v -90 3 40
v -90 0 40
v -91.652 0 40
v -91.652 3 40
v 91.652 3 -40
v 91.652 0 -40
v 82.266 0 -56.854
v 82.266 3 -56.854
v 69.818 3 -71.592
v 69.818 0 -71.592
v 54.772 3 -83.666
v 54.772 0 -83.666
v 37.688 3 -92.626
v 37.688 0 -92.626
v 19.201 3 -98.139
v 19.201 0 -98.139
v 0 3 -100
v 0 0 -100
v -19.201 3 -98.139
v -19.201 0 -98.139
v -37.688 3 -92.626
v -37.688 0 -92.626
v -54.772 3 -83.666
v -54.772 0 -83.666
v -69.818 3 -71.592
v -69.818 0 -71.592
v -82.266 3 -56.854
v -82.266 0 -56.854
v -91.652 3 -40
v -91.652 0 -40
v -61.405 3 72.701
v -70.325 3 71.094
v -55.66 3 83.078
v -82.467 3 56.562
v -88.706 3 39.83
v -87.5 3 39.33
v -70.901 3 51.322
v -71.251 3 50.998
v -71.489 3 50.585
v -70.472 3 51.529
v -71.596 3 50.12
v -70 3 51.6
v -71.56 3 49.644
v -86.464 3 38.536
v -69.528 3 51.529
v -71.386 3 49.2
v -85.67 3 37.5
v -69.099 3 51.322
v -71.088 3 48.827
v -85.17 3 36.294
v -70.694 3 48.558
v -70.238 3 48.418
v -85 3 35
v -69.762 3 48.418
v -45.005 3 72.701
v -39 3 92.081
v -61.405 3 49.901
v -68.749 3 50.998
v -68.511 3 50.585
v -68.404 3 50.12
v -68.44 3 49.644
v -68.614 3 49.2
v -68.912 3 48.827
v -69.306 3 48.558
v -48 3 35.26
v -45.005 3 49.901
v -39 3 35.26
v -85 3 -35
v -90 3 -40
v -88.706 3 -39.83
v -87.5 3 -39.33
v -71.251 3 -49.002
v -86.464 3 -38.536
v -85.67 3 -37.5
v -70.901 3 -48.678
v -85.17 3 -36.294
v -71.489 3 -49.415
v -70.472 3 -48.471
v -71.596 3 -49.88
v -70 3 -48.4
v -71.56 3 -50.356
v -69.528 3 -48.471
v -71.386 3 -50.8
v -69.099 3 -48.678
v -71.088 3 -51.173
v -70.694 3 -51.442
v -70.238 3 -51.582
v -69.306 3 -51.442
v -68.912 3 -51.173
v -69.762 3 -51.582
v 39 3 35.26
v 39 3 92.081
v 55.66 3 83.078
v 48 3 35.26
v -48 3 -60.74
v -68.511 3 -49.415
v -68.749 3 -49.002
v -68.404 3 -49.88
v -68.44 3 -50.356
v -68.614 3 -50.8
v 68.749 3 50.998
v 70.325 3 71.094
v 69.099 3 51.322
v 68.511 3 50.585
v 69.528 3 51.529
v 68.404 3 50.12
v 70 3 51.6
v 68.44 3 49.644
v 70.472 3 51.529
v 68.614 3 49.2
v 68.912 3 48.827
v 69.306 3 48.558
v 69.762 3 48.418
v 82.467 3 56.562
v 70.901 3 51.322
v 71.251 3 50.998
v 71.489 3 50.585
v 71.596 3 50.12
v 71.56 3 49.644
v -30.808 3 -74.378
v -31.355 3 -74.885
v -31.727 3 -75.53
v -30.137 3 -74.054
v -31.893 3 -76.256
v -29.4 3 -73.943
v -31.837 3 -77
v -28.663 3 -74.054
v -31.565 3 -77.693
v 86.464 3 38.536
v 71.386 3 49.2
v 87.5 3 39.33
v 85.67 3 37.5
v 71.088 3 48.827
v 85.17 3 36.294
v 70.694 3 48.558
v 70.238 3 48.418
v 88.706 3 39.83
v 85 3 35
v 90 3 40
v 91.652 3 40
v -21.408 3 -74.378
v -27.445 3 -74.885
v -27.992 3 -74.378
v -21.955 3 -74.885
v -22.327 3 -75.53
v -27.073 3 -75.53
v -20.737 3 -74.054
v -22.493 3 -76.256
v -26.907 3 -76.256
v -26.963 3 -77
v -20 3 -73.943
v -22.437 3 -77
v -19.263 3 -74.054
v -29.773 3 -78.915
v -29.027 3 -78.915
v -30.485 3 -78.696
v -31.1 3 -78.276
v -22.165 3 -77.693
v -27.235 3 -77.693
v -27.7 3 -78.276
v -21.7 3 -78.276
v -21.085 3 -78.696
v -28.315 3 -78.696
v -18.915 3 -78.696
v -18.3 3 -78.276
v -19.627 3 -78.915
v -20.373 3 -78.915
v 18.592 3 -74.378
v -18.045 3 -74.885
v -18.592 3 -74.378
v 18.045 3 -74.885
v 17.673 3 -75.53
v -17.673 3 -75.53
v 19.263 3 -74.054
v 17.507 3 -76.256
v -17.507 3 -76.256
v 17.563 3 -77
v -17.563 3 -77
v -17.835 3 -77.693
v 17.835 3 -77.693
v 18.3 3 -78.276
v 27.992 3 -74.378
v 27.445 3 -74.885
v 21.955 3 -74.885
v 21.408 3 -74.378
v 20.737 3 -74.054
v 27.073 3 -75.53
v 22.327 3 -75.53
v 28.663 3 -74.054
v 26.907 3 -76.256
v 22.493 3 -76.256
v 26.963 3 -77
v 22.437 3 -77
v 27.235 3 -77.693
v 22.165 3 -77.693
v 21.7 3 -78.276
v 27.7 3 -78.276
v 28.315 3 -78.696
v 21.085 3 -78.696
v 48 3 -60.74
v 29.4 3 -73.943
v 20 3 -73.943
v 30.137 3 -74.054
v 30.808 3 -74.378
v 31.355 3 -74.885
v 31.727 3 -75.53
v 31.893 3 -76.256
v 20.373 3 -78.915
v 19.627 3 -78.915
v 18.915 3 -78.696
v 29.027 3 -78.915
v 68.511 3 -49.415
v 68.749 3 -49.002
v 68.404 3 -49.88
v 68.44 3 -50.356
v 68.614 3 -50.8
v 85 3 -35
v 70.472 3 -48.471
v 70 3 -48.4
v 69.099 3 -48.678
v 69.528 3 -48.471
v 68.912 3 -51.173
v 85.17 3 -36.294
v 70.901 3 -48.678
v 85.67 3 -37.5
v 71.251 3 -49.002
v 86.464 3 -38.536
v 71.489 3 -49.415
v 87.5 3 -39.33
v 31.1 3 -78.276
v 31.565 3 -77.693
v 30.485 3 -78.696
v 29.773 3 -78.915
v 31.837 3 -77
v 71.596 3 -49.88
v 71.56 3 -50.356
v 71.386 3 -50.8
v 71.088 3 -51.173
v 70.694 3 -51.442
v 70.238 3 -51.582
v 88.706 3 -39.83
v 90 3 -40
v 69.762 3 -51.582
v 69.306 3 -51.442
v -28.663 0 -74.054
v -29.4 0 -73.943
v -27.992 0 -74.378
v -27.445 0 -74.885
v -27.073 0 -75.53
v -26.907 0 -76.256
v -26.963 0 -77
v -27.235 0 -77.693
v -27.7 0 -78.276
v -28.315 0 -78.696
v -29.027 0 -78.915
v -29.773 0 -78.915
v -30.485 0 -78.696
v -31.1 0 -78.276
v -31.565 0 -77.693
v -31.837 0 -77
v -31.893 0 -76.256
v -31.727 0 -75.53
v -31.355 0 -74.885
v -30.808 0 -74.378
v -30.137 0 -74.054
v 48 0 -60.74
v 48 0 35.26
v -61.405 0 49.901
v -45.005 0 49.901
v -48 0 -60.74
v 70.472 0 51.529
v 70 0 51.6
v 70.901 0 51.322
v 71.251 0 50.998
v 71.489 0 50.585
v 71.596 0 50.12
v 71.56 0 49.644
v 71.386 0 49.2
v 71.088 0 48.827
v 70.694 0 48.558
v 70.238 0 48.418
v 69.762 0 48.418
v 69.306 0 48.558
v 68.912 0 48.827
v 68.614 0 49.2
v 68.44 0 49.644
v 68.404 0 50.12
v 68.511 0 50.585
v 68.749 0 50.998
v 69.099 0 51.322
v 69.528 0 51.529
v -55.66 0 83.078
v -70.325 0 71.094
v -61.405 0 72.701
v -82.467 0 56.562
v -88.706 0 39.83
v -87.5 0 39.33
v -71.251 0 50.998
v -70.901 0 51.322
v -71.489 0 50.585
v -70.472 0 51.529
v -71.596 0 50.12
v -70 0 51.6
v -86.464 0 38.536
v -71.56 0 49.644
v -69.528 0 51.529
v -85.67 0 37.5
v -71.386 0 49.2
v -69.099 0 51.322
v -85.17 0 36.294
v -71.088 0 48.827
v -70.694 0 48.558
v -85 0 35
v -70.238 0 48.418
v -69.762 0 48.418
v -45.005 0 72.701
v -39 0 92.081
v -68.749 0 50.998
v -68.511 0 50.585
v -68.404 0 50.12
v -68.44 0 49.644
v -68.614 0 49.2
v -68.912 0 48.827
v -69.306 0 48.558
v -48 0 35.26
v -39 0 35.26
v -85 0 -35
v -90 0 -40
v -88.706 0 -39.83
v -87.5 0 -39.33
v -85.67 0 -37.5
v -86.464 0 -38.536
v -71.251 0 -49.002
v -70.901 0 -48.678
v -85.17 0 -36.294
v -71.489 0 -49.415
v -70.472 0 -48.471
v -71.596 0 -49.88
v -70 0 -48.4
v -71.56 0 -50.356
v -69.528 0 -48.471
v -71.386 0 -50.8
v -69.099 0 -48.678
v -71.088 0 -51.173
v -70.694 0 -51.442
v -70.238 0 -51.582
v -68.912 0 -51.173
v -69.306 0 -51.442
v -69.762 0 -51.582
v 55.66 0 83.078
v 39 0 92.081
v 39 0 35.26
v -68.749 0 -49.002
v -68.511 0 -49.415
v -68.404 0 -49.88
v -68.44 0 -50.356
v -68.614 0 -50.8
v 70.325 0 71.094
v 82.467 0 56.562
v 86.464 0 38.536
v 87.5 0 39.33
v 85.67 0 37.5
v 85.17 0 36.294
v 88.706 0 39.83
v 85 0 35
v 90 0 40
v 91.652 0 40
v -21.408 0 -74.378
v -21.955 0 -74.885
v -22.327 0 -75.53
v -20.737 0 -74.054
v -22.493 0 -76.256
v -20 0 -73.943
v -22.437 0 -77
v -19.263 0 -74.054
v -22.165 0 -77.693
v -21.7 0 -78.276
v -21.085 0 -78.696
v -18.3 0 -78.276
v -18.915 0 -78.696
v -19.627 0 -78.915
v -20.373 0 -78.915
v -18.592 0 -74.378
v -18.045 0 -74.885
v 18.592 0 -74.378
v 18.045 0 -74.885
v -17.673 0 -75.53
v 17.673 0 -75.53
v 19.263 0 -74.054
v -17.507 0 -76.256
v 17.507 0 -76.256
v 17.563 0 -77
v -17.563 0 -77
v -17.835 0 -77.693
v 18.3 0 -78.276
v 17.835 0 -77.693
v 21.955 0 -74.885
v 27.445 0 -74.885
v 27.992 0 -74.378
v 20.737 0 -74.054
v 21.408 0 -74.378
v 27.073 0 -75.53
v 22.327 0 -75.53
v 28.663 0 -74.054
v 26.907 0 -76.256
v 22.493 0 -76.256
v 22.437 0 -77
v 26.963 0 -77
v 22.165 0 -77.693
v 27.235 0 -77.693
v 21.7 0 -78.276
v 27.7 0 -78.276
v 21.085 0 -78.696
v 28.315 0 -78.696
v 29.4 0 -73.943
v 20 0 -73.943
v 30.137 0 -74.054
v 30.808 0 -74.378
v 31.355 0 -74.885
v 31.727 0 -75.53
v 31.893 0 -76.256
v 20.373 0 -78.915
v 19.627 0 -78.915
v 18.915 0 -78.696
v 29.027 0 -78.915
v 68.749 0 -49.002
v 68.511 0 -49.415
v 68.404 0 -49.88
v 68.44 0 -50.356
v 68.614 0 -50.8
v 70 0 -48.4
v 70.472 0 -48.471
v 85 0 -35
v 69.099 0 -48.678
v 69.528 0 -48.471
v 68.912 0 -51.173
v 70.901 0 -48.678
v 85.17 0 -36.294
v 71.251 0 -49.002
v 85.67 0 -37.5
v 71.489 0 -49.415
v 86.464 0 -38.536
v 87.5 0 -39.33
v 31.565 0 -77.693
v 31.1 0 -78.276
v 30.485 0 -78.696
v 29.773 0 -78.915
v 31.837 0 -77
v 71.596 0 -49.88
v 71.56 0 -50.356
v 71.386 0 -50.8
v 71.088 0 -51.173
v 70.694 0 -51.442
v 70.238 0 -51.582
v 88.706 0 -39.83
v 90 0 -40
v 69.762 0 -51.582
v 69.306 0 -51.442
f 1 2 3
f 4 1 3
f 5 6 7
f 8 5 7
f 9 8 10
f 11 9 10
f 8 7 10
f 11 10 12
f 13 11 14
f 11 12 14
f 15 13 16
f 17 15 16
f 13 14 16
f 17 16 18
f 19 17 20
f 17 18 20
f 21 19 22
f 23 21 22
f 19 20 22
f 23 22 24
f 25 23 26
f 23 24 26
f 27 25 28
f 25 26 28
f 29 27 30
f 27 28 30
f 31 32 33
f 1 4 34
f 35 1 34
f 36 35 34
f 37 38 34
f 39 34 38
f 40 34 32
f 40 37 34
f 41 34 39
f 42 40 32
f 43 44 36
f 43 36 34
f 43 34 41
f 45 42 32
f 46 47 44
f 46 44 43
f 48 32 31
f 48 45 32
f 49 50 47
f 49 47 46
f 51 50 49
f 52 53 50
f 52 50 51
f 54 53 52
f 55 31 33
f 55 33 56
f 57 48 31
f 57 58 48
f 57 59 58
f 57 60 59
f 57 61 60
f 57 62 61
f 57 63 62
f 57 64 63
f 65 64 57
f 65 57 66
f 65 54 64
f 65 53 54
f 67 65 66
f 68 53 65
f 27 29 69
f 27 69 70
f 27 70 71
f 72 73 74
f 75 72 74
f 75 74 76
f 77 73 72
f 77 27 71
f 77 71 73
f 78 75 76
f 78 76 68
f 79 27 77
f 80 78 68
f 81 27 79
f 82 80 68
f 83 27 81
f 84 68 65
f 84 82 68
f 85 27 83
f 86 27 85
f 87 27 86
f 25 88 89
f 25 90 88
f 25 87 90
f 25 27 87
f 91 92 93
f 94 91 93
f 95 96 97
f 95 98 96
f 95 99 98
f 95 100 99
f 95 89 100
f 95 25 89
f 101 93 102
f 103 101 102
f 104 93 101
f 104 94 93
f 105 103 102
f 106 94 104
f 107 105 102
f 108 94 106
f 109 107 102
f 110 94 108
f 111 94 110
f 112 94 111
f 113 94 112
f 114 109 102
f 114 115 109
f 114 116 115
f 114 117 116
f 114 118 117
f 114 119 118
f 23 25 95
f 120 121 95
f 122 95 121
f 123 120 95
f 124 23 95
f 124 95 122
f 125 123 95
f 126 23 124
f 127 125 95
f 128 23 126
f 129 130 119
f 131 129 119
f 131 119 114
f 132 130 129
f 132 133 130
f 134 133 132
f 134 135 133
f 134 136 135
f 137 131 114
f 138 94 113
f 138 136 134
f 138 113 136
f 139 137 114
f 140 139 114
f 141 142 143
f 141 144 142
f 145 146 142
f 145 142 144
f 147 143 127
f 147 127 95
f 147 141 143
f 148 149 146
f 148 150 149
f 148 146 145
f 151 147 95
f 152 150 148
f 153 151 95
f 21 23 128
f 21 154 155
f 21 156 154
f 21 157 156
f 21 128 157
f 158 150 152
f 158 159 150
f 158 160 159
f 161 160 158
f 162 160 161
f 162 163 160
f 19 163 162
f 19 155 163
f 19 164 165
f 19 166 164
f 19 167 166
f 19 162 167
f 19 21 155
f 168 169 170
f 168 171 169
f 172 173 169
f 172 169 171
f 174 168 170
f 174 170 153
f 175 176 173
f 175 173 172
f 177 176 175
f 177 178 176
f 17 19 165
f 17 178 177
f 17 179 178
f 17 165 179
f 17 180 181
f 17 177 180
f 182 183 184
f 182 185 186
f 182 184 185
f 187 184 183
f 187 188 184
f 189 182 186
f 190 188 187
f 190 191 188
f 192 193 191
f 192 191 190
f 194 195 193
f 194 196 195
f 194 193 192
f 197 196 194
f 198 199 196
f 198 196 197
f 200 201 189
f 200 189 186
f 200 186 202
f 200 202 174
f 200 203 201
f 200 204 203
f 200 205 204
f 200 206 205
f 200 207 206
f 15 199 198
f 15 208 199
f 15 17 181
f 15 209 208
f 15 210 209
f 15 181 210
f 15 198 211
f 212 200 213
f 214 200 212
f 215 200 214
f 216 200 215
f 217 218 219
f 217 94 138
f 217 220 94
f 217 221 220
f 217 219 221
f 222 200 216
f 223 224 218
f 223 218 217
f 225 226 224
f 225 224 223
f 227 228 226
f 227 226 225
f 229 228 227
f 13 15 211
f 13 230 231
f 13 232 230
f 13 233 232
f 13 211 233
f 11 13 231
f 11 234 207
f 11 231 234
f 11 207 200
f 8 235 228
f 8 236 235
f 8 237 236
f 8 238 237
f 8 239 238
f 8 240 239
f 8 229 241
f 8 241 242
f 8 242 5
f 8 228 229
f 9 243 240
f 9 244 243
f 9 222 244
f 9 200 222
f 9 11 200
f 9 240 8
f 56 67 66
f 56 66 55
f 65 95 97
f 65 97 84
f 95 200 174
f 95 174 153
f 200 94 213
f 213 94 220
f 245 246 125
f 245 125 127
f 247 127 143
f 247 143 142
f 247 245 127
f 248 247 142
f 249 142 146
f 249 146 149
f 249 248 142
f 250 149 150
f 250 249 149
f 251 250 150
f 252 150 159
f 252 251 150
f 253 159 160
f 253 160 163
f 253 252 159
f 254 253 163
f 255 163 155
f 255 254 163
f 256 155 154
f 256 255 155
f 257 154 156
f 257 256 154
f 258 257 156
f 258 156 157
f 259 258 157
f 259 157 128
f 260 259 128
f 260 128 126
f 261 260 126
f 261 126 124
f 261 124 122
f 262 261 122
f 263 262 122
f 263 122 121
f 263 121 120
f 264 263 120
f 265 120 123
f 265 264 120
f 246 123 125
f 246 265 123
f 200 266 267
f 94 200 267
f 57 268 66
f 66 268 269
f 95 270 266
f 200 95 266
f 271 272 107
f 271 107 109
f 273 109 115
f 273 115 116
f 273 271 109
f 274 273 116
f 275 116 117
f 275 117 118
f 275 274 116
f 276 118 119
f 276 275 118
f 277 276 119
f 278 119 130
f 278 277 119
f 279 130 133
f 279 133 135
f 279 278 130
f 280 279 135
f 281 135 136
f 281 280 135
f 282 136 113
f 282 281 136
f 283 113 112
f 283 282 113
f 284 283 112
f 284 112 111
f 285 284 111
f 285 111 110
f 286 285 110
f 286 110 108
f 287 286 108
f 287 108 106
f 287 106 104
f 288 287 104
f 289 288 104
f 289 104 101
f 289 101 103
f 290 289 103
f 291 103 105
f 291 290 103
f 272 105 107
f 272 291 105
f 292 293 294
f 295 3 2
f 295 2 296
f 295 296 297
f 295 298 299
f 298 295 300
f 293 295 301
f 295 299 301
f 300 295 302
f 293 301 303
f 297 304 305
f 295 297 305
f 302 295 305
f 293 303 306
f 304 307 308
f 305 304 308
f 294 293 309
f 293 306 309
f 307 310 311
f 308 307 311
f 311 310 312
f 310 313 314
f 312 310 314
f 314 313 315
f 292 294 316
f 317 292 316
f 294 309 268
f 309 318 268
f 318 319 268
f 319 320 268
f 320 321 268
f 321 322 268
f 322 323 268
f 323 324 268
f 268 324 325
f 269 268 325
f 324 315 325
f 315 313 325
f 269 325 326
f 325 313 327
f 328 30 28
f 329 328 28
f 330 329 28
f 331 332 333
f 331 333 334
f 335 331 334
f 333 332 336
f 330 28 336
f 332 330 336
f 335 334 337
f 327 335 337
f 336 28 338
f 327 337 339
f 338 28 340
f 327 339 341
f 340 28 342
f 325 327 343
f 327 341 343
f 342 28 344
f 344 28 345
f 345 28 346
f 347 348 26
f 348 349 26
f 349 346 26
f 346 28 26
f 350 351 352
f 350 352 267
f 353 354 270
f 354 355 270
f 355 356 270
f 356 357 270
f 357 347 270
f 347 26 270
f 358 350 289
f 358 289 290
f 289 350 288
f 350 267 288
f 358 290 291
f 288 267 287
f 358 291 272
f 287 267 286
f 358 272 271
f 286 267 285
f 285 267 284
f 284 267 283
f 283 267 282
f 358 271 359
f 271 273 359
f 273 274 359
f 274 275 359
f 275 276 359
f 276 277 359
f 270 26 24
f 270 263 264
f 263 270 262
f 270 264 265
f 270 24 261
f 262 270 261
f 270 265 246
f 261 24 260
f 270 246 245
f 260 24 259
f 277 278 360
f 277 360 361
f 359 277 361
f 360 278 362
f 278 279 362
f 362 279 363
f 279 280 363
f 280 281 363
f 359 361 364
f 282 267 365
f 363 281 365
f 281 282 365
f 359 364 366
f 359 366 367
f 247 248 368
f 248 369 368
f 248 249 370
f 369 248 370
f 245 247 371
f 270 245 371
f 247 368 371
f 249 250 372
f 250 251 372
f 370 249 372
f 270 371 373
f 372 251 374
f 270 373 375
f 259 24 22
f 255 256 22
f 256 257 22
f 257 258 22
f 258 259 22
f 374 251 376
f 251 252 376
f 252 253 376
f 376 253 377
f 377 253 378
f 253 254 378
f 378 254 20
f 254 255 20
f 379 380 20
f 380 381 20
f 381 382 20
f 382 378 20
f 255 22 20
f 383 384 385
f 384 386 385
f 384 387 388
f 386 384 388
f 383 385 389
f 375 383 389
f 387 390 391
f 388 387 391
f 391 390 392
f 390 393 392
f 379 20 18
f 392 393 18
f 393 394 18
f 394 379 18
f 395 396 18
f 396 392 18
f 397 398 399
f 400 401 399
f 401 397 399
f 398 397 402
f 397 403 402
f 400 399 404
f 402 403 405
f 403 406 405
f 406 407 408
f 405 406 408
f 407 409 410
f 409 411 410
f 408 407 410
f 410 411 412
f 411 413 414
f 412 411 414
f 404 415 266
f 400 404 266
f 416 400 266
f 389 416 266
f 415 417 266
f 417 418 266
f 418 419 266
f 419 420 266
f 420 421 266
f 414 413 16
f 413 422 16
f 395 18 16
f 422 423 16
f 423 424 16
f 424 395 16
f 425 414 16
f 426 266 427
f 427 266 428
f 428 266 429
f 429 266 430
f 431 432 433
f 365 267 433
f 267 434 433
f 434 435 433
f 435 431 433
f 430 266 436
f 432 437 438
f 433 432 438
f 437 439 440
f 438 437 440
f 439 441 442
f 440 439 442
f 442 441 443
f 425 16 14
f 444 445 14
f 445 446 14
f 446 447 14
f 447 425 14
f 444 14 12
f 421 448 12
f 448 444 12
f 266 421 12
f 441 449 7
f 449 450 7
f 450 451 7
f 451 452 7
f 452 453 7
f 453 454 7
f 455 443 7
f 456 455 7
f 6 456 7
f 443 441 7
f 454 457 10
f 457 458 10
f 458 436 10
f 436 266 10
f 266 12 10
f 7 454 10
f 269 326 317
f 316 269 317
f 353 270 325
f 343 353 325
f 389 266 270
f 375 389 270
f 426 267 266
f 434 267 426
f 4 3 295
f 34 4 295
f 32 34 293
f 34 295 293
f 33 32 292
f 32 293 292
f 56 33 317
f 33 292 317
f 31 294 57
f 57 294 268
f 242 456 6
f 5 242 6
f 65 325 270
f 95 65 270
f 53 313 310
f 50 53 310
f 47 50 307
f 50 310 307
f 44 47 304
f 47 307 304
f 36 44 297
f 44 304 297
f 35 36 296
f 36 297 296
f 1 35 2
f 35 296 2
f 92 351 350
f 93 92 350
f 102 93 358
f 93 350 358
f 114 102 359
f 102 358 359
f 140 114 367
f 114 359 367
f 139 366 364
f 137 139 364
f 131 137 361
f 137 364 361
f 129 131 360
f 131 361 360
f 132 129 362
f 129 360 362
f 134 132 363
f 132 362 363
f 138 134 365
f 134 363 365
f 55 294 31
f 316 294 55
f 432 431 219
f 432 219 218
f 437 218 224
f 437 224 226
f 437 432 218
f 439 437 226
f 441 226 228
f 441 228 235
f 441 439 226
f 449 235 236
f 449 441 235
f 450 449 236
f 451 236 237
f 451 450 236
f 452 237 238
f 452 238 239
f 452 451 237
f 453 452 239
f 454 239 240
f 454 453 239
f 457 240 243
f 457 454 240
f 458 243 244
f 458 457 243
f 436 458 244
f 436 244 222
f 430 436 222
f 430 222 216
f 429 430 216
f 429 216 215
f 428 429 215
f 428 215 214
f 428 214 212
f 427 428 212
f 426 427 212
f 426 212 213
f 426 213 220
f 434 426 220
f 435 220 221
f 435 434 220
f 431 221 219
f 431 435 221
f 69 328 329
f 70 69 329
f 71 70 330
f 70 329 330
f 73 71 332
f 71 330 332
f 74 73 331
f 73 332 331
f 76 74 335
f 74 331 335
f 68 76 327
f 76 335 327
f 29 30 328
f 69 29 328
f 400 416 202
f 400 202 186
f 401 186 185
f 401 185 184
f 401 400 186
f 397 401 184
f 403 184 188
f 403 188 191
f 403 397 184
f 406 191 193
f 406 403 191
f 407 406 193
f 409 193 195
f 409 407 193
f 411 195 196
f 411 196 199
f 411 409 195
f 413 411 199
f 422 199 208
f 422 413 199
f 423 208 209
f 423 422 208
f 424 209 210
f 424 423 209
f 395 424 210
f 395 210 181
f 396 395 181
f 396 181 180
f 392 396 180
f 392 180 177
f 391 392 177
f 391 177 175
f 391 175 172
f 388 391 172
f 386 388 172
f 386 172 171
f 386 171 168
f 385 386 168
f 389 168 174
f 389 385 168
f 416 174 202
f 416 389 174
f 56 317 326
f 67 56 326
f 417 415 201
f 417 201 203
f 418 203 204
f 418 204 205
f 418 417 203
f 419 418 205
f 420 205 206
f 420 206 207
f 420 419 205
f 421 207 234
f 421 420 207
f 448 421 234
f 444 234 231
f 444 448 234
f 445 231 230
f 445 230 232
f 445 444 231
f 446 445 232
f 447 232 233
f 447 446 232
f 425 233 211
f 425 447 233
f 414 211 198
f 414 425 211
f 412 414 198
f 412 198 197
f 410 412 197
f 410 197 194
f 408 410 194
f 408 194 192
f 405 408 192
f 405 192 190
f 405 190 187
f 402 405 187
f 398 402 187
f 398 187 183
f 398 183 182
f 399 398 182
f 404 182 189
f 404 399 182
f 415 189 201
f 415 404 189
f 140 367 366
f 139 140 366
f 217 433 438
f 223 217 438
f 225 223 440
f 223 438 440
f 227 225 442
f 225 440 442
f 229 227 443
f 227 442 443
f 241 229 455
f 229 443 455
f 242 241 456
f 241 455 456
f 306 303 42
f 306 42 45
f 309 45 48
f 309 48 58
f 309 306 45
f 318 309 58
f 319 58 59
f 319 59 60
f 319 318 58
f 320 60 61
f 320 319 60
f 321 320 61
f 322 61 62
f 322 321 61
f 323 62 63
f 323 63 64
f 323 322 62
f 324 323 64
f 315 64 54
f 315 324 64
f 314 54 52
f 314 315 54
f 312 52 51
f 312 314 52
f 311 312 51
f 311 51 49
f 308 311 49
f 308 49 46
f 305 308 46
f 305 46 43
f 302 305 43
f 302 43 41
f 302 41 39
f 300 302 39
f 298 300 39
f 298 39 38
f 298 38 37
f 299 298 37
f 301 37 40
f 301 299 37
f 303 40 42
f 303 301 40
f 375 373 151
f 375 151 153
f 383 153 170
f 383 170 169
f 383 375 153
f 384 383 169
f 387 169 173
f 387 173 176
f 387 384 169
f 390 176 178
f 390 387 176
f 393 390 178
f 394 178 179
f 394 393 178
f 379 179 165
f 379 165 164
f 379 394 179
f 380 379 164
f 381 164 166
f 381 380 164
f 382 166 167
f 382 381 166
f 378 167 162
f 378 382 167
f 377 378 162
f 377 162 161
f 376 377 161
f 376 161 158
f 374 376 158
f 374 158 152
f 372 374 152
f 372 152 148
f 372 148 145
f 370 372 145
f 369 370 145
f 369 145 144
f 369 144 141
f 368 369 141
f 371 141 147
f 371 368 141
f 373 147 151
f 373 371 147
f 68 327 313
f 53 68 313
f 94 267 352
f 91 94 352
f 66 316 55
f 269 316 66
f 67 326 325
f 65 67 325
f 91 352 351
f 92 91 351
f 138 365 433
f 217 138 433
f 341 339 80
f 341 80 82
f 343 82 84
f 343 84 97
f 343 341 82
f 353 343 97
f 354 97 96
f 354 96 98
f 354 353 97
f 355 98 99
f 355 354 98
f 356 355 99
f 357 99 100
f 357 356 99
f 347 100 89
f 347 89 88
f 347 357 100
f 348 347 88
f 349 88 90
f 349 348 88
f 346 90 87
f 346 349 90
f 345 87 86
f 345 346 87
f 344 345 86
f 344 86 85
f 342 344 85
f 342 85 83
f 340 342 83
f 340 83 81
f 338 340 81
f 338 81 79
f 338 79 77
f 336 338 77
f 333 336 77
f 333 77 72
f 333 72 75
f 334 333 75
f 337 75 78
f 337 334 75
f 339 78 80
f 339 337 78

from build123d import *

# Parameters (mm, degrees)
SKETCH_1_W      = 16.4
SKETCH_1_H      = 22.8
SKETCH_1_R      = 1.6
SKETCH_1_R_2    = 2.5
EXTRUDE_1_DEPTH = 3


with BuildPart() as part:
    # 草圖1 → 填料-伸長1 (new body)
    with BuildSketch(Plane(origin=(0, 0, 0), x_dir=(1, 0, 0), z_dir=(0, 1, 0))):
        with BuildLine():
            ThreePointArc((39, -92.081485653), (70.324780895, -71.094480742), (91.651513899, -40))
            Line((91.651513899, -40), (90, -40))
            ThreePointArc((90, -40), (86.464466094, -38.535533906), (85, -35))
            Line((85, -35), (85, 35))
            ThreePointArc((85, 35), (86.464466094, 38.535533906), (90, 40))
            Line((90, 40), (91.651513899, 40))
            ThreePointArc((91.651513899, 40), (0, 100), (-91.651513899, 40))
            Line((-91.651513899, 40), (-90, 40))
            ThreePointArc((-90, 40), (-86.464466094, 38.535533906), (-85, 35))
            Line((-85, 35), (-85, -35))
            ThreePointArc((-85, -35), (-86.464466094, -38.535533906), (-90, -40))
            Line((-90, -40), (-91.651513899, -40))
            ThreePointArc((-91.651513899, -40), (-70.324780895, -71.094480742), (-39, -92.081485653))
            Line((-39, -92.081485653), (-39, -35.26))
            Line((-39, -35.26), (-48, -35.26))
            Line((-48, -35.26), (-48, 60.74))
            Line((-48, 60.74), (48, 60.74))
            Line((48, 60.74), (48, -35.26))
            Line((48, -35.26), (39, -35.26))
            Line((39, -35.26), (39, -92.081485653))
        make_face()
        with Locations((-53.204834595, -61.300870246)):
            Rectangle(SKETCH_1_W, SKETCH_1_H, mode=Mode.SUBTRACT)
        with Locations(Location((-70, -50, 0), (0, 0, 270))):
            Circle(SKETCH_1_R, mode=Mode.SUBTRACT)
        with Locations(Location((70, -50, 0), (0, 0, 270))):
            Circle(SKETCH_1_R, mode=Mode.SUBTRACT)
        with Locations(Location((-70, 50, 0), (0, 0, 270))):
            Circle(SKETCH_1_R, mode=Mode.SUBTRACT)
        with Locations(Location((-29.4, 76.443273383, 0), (0, 0, 270))):
            Circle(SKETCH_1_R_2, mode=Mode.SUBTRACT)
        with Locations(Location((-20, 76.443273383, 0), (0, 0, 270))):
            Circle(SKETCH_1_R_2, mode=Mode.SUBTRACT)
        with Locations(Location((20, 76.443273383, 0), (0, 0, 270))):
            Circle(SKETCH_1_R_2, mode=Mode.SUBTRACT)
        with Locations(Location((29.4, 76.443273383, 0), (0, 0, 270))):
            Circle(SKETCH_1_R_2, mode=Mode.SUBTRACT)
        with Locations(Location((70, 50, 0), (0, 0, 270))):
            Circle(SKETCH_1_R, mode=Mode.SUBTRACT)
    extrude(amount=EXTRUDE_1_DEPTH)


solid = part.part
